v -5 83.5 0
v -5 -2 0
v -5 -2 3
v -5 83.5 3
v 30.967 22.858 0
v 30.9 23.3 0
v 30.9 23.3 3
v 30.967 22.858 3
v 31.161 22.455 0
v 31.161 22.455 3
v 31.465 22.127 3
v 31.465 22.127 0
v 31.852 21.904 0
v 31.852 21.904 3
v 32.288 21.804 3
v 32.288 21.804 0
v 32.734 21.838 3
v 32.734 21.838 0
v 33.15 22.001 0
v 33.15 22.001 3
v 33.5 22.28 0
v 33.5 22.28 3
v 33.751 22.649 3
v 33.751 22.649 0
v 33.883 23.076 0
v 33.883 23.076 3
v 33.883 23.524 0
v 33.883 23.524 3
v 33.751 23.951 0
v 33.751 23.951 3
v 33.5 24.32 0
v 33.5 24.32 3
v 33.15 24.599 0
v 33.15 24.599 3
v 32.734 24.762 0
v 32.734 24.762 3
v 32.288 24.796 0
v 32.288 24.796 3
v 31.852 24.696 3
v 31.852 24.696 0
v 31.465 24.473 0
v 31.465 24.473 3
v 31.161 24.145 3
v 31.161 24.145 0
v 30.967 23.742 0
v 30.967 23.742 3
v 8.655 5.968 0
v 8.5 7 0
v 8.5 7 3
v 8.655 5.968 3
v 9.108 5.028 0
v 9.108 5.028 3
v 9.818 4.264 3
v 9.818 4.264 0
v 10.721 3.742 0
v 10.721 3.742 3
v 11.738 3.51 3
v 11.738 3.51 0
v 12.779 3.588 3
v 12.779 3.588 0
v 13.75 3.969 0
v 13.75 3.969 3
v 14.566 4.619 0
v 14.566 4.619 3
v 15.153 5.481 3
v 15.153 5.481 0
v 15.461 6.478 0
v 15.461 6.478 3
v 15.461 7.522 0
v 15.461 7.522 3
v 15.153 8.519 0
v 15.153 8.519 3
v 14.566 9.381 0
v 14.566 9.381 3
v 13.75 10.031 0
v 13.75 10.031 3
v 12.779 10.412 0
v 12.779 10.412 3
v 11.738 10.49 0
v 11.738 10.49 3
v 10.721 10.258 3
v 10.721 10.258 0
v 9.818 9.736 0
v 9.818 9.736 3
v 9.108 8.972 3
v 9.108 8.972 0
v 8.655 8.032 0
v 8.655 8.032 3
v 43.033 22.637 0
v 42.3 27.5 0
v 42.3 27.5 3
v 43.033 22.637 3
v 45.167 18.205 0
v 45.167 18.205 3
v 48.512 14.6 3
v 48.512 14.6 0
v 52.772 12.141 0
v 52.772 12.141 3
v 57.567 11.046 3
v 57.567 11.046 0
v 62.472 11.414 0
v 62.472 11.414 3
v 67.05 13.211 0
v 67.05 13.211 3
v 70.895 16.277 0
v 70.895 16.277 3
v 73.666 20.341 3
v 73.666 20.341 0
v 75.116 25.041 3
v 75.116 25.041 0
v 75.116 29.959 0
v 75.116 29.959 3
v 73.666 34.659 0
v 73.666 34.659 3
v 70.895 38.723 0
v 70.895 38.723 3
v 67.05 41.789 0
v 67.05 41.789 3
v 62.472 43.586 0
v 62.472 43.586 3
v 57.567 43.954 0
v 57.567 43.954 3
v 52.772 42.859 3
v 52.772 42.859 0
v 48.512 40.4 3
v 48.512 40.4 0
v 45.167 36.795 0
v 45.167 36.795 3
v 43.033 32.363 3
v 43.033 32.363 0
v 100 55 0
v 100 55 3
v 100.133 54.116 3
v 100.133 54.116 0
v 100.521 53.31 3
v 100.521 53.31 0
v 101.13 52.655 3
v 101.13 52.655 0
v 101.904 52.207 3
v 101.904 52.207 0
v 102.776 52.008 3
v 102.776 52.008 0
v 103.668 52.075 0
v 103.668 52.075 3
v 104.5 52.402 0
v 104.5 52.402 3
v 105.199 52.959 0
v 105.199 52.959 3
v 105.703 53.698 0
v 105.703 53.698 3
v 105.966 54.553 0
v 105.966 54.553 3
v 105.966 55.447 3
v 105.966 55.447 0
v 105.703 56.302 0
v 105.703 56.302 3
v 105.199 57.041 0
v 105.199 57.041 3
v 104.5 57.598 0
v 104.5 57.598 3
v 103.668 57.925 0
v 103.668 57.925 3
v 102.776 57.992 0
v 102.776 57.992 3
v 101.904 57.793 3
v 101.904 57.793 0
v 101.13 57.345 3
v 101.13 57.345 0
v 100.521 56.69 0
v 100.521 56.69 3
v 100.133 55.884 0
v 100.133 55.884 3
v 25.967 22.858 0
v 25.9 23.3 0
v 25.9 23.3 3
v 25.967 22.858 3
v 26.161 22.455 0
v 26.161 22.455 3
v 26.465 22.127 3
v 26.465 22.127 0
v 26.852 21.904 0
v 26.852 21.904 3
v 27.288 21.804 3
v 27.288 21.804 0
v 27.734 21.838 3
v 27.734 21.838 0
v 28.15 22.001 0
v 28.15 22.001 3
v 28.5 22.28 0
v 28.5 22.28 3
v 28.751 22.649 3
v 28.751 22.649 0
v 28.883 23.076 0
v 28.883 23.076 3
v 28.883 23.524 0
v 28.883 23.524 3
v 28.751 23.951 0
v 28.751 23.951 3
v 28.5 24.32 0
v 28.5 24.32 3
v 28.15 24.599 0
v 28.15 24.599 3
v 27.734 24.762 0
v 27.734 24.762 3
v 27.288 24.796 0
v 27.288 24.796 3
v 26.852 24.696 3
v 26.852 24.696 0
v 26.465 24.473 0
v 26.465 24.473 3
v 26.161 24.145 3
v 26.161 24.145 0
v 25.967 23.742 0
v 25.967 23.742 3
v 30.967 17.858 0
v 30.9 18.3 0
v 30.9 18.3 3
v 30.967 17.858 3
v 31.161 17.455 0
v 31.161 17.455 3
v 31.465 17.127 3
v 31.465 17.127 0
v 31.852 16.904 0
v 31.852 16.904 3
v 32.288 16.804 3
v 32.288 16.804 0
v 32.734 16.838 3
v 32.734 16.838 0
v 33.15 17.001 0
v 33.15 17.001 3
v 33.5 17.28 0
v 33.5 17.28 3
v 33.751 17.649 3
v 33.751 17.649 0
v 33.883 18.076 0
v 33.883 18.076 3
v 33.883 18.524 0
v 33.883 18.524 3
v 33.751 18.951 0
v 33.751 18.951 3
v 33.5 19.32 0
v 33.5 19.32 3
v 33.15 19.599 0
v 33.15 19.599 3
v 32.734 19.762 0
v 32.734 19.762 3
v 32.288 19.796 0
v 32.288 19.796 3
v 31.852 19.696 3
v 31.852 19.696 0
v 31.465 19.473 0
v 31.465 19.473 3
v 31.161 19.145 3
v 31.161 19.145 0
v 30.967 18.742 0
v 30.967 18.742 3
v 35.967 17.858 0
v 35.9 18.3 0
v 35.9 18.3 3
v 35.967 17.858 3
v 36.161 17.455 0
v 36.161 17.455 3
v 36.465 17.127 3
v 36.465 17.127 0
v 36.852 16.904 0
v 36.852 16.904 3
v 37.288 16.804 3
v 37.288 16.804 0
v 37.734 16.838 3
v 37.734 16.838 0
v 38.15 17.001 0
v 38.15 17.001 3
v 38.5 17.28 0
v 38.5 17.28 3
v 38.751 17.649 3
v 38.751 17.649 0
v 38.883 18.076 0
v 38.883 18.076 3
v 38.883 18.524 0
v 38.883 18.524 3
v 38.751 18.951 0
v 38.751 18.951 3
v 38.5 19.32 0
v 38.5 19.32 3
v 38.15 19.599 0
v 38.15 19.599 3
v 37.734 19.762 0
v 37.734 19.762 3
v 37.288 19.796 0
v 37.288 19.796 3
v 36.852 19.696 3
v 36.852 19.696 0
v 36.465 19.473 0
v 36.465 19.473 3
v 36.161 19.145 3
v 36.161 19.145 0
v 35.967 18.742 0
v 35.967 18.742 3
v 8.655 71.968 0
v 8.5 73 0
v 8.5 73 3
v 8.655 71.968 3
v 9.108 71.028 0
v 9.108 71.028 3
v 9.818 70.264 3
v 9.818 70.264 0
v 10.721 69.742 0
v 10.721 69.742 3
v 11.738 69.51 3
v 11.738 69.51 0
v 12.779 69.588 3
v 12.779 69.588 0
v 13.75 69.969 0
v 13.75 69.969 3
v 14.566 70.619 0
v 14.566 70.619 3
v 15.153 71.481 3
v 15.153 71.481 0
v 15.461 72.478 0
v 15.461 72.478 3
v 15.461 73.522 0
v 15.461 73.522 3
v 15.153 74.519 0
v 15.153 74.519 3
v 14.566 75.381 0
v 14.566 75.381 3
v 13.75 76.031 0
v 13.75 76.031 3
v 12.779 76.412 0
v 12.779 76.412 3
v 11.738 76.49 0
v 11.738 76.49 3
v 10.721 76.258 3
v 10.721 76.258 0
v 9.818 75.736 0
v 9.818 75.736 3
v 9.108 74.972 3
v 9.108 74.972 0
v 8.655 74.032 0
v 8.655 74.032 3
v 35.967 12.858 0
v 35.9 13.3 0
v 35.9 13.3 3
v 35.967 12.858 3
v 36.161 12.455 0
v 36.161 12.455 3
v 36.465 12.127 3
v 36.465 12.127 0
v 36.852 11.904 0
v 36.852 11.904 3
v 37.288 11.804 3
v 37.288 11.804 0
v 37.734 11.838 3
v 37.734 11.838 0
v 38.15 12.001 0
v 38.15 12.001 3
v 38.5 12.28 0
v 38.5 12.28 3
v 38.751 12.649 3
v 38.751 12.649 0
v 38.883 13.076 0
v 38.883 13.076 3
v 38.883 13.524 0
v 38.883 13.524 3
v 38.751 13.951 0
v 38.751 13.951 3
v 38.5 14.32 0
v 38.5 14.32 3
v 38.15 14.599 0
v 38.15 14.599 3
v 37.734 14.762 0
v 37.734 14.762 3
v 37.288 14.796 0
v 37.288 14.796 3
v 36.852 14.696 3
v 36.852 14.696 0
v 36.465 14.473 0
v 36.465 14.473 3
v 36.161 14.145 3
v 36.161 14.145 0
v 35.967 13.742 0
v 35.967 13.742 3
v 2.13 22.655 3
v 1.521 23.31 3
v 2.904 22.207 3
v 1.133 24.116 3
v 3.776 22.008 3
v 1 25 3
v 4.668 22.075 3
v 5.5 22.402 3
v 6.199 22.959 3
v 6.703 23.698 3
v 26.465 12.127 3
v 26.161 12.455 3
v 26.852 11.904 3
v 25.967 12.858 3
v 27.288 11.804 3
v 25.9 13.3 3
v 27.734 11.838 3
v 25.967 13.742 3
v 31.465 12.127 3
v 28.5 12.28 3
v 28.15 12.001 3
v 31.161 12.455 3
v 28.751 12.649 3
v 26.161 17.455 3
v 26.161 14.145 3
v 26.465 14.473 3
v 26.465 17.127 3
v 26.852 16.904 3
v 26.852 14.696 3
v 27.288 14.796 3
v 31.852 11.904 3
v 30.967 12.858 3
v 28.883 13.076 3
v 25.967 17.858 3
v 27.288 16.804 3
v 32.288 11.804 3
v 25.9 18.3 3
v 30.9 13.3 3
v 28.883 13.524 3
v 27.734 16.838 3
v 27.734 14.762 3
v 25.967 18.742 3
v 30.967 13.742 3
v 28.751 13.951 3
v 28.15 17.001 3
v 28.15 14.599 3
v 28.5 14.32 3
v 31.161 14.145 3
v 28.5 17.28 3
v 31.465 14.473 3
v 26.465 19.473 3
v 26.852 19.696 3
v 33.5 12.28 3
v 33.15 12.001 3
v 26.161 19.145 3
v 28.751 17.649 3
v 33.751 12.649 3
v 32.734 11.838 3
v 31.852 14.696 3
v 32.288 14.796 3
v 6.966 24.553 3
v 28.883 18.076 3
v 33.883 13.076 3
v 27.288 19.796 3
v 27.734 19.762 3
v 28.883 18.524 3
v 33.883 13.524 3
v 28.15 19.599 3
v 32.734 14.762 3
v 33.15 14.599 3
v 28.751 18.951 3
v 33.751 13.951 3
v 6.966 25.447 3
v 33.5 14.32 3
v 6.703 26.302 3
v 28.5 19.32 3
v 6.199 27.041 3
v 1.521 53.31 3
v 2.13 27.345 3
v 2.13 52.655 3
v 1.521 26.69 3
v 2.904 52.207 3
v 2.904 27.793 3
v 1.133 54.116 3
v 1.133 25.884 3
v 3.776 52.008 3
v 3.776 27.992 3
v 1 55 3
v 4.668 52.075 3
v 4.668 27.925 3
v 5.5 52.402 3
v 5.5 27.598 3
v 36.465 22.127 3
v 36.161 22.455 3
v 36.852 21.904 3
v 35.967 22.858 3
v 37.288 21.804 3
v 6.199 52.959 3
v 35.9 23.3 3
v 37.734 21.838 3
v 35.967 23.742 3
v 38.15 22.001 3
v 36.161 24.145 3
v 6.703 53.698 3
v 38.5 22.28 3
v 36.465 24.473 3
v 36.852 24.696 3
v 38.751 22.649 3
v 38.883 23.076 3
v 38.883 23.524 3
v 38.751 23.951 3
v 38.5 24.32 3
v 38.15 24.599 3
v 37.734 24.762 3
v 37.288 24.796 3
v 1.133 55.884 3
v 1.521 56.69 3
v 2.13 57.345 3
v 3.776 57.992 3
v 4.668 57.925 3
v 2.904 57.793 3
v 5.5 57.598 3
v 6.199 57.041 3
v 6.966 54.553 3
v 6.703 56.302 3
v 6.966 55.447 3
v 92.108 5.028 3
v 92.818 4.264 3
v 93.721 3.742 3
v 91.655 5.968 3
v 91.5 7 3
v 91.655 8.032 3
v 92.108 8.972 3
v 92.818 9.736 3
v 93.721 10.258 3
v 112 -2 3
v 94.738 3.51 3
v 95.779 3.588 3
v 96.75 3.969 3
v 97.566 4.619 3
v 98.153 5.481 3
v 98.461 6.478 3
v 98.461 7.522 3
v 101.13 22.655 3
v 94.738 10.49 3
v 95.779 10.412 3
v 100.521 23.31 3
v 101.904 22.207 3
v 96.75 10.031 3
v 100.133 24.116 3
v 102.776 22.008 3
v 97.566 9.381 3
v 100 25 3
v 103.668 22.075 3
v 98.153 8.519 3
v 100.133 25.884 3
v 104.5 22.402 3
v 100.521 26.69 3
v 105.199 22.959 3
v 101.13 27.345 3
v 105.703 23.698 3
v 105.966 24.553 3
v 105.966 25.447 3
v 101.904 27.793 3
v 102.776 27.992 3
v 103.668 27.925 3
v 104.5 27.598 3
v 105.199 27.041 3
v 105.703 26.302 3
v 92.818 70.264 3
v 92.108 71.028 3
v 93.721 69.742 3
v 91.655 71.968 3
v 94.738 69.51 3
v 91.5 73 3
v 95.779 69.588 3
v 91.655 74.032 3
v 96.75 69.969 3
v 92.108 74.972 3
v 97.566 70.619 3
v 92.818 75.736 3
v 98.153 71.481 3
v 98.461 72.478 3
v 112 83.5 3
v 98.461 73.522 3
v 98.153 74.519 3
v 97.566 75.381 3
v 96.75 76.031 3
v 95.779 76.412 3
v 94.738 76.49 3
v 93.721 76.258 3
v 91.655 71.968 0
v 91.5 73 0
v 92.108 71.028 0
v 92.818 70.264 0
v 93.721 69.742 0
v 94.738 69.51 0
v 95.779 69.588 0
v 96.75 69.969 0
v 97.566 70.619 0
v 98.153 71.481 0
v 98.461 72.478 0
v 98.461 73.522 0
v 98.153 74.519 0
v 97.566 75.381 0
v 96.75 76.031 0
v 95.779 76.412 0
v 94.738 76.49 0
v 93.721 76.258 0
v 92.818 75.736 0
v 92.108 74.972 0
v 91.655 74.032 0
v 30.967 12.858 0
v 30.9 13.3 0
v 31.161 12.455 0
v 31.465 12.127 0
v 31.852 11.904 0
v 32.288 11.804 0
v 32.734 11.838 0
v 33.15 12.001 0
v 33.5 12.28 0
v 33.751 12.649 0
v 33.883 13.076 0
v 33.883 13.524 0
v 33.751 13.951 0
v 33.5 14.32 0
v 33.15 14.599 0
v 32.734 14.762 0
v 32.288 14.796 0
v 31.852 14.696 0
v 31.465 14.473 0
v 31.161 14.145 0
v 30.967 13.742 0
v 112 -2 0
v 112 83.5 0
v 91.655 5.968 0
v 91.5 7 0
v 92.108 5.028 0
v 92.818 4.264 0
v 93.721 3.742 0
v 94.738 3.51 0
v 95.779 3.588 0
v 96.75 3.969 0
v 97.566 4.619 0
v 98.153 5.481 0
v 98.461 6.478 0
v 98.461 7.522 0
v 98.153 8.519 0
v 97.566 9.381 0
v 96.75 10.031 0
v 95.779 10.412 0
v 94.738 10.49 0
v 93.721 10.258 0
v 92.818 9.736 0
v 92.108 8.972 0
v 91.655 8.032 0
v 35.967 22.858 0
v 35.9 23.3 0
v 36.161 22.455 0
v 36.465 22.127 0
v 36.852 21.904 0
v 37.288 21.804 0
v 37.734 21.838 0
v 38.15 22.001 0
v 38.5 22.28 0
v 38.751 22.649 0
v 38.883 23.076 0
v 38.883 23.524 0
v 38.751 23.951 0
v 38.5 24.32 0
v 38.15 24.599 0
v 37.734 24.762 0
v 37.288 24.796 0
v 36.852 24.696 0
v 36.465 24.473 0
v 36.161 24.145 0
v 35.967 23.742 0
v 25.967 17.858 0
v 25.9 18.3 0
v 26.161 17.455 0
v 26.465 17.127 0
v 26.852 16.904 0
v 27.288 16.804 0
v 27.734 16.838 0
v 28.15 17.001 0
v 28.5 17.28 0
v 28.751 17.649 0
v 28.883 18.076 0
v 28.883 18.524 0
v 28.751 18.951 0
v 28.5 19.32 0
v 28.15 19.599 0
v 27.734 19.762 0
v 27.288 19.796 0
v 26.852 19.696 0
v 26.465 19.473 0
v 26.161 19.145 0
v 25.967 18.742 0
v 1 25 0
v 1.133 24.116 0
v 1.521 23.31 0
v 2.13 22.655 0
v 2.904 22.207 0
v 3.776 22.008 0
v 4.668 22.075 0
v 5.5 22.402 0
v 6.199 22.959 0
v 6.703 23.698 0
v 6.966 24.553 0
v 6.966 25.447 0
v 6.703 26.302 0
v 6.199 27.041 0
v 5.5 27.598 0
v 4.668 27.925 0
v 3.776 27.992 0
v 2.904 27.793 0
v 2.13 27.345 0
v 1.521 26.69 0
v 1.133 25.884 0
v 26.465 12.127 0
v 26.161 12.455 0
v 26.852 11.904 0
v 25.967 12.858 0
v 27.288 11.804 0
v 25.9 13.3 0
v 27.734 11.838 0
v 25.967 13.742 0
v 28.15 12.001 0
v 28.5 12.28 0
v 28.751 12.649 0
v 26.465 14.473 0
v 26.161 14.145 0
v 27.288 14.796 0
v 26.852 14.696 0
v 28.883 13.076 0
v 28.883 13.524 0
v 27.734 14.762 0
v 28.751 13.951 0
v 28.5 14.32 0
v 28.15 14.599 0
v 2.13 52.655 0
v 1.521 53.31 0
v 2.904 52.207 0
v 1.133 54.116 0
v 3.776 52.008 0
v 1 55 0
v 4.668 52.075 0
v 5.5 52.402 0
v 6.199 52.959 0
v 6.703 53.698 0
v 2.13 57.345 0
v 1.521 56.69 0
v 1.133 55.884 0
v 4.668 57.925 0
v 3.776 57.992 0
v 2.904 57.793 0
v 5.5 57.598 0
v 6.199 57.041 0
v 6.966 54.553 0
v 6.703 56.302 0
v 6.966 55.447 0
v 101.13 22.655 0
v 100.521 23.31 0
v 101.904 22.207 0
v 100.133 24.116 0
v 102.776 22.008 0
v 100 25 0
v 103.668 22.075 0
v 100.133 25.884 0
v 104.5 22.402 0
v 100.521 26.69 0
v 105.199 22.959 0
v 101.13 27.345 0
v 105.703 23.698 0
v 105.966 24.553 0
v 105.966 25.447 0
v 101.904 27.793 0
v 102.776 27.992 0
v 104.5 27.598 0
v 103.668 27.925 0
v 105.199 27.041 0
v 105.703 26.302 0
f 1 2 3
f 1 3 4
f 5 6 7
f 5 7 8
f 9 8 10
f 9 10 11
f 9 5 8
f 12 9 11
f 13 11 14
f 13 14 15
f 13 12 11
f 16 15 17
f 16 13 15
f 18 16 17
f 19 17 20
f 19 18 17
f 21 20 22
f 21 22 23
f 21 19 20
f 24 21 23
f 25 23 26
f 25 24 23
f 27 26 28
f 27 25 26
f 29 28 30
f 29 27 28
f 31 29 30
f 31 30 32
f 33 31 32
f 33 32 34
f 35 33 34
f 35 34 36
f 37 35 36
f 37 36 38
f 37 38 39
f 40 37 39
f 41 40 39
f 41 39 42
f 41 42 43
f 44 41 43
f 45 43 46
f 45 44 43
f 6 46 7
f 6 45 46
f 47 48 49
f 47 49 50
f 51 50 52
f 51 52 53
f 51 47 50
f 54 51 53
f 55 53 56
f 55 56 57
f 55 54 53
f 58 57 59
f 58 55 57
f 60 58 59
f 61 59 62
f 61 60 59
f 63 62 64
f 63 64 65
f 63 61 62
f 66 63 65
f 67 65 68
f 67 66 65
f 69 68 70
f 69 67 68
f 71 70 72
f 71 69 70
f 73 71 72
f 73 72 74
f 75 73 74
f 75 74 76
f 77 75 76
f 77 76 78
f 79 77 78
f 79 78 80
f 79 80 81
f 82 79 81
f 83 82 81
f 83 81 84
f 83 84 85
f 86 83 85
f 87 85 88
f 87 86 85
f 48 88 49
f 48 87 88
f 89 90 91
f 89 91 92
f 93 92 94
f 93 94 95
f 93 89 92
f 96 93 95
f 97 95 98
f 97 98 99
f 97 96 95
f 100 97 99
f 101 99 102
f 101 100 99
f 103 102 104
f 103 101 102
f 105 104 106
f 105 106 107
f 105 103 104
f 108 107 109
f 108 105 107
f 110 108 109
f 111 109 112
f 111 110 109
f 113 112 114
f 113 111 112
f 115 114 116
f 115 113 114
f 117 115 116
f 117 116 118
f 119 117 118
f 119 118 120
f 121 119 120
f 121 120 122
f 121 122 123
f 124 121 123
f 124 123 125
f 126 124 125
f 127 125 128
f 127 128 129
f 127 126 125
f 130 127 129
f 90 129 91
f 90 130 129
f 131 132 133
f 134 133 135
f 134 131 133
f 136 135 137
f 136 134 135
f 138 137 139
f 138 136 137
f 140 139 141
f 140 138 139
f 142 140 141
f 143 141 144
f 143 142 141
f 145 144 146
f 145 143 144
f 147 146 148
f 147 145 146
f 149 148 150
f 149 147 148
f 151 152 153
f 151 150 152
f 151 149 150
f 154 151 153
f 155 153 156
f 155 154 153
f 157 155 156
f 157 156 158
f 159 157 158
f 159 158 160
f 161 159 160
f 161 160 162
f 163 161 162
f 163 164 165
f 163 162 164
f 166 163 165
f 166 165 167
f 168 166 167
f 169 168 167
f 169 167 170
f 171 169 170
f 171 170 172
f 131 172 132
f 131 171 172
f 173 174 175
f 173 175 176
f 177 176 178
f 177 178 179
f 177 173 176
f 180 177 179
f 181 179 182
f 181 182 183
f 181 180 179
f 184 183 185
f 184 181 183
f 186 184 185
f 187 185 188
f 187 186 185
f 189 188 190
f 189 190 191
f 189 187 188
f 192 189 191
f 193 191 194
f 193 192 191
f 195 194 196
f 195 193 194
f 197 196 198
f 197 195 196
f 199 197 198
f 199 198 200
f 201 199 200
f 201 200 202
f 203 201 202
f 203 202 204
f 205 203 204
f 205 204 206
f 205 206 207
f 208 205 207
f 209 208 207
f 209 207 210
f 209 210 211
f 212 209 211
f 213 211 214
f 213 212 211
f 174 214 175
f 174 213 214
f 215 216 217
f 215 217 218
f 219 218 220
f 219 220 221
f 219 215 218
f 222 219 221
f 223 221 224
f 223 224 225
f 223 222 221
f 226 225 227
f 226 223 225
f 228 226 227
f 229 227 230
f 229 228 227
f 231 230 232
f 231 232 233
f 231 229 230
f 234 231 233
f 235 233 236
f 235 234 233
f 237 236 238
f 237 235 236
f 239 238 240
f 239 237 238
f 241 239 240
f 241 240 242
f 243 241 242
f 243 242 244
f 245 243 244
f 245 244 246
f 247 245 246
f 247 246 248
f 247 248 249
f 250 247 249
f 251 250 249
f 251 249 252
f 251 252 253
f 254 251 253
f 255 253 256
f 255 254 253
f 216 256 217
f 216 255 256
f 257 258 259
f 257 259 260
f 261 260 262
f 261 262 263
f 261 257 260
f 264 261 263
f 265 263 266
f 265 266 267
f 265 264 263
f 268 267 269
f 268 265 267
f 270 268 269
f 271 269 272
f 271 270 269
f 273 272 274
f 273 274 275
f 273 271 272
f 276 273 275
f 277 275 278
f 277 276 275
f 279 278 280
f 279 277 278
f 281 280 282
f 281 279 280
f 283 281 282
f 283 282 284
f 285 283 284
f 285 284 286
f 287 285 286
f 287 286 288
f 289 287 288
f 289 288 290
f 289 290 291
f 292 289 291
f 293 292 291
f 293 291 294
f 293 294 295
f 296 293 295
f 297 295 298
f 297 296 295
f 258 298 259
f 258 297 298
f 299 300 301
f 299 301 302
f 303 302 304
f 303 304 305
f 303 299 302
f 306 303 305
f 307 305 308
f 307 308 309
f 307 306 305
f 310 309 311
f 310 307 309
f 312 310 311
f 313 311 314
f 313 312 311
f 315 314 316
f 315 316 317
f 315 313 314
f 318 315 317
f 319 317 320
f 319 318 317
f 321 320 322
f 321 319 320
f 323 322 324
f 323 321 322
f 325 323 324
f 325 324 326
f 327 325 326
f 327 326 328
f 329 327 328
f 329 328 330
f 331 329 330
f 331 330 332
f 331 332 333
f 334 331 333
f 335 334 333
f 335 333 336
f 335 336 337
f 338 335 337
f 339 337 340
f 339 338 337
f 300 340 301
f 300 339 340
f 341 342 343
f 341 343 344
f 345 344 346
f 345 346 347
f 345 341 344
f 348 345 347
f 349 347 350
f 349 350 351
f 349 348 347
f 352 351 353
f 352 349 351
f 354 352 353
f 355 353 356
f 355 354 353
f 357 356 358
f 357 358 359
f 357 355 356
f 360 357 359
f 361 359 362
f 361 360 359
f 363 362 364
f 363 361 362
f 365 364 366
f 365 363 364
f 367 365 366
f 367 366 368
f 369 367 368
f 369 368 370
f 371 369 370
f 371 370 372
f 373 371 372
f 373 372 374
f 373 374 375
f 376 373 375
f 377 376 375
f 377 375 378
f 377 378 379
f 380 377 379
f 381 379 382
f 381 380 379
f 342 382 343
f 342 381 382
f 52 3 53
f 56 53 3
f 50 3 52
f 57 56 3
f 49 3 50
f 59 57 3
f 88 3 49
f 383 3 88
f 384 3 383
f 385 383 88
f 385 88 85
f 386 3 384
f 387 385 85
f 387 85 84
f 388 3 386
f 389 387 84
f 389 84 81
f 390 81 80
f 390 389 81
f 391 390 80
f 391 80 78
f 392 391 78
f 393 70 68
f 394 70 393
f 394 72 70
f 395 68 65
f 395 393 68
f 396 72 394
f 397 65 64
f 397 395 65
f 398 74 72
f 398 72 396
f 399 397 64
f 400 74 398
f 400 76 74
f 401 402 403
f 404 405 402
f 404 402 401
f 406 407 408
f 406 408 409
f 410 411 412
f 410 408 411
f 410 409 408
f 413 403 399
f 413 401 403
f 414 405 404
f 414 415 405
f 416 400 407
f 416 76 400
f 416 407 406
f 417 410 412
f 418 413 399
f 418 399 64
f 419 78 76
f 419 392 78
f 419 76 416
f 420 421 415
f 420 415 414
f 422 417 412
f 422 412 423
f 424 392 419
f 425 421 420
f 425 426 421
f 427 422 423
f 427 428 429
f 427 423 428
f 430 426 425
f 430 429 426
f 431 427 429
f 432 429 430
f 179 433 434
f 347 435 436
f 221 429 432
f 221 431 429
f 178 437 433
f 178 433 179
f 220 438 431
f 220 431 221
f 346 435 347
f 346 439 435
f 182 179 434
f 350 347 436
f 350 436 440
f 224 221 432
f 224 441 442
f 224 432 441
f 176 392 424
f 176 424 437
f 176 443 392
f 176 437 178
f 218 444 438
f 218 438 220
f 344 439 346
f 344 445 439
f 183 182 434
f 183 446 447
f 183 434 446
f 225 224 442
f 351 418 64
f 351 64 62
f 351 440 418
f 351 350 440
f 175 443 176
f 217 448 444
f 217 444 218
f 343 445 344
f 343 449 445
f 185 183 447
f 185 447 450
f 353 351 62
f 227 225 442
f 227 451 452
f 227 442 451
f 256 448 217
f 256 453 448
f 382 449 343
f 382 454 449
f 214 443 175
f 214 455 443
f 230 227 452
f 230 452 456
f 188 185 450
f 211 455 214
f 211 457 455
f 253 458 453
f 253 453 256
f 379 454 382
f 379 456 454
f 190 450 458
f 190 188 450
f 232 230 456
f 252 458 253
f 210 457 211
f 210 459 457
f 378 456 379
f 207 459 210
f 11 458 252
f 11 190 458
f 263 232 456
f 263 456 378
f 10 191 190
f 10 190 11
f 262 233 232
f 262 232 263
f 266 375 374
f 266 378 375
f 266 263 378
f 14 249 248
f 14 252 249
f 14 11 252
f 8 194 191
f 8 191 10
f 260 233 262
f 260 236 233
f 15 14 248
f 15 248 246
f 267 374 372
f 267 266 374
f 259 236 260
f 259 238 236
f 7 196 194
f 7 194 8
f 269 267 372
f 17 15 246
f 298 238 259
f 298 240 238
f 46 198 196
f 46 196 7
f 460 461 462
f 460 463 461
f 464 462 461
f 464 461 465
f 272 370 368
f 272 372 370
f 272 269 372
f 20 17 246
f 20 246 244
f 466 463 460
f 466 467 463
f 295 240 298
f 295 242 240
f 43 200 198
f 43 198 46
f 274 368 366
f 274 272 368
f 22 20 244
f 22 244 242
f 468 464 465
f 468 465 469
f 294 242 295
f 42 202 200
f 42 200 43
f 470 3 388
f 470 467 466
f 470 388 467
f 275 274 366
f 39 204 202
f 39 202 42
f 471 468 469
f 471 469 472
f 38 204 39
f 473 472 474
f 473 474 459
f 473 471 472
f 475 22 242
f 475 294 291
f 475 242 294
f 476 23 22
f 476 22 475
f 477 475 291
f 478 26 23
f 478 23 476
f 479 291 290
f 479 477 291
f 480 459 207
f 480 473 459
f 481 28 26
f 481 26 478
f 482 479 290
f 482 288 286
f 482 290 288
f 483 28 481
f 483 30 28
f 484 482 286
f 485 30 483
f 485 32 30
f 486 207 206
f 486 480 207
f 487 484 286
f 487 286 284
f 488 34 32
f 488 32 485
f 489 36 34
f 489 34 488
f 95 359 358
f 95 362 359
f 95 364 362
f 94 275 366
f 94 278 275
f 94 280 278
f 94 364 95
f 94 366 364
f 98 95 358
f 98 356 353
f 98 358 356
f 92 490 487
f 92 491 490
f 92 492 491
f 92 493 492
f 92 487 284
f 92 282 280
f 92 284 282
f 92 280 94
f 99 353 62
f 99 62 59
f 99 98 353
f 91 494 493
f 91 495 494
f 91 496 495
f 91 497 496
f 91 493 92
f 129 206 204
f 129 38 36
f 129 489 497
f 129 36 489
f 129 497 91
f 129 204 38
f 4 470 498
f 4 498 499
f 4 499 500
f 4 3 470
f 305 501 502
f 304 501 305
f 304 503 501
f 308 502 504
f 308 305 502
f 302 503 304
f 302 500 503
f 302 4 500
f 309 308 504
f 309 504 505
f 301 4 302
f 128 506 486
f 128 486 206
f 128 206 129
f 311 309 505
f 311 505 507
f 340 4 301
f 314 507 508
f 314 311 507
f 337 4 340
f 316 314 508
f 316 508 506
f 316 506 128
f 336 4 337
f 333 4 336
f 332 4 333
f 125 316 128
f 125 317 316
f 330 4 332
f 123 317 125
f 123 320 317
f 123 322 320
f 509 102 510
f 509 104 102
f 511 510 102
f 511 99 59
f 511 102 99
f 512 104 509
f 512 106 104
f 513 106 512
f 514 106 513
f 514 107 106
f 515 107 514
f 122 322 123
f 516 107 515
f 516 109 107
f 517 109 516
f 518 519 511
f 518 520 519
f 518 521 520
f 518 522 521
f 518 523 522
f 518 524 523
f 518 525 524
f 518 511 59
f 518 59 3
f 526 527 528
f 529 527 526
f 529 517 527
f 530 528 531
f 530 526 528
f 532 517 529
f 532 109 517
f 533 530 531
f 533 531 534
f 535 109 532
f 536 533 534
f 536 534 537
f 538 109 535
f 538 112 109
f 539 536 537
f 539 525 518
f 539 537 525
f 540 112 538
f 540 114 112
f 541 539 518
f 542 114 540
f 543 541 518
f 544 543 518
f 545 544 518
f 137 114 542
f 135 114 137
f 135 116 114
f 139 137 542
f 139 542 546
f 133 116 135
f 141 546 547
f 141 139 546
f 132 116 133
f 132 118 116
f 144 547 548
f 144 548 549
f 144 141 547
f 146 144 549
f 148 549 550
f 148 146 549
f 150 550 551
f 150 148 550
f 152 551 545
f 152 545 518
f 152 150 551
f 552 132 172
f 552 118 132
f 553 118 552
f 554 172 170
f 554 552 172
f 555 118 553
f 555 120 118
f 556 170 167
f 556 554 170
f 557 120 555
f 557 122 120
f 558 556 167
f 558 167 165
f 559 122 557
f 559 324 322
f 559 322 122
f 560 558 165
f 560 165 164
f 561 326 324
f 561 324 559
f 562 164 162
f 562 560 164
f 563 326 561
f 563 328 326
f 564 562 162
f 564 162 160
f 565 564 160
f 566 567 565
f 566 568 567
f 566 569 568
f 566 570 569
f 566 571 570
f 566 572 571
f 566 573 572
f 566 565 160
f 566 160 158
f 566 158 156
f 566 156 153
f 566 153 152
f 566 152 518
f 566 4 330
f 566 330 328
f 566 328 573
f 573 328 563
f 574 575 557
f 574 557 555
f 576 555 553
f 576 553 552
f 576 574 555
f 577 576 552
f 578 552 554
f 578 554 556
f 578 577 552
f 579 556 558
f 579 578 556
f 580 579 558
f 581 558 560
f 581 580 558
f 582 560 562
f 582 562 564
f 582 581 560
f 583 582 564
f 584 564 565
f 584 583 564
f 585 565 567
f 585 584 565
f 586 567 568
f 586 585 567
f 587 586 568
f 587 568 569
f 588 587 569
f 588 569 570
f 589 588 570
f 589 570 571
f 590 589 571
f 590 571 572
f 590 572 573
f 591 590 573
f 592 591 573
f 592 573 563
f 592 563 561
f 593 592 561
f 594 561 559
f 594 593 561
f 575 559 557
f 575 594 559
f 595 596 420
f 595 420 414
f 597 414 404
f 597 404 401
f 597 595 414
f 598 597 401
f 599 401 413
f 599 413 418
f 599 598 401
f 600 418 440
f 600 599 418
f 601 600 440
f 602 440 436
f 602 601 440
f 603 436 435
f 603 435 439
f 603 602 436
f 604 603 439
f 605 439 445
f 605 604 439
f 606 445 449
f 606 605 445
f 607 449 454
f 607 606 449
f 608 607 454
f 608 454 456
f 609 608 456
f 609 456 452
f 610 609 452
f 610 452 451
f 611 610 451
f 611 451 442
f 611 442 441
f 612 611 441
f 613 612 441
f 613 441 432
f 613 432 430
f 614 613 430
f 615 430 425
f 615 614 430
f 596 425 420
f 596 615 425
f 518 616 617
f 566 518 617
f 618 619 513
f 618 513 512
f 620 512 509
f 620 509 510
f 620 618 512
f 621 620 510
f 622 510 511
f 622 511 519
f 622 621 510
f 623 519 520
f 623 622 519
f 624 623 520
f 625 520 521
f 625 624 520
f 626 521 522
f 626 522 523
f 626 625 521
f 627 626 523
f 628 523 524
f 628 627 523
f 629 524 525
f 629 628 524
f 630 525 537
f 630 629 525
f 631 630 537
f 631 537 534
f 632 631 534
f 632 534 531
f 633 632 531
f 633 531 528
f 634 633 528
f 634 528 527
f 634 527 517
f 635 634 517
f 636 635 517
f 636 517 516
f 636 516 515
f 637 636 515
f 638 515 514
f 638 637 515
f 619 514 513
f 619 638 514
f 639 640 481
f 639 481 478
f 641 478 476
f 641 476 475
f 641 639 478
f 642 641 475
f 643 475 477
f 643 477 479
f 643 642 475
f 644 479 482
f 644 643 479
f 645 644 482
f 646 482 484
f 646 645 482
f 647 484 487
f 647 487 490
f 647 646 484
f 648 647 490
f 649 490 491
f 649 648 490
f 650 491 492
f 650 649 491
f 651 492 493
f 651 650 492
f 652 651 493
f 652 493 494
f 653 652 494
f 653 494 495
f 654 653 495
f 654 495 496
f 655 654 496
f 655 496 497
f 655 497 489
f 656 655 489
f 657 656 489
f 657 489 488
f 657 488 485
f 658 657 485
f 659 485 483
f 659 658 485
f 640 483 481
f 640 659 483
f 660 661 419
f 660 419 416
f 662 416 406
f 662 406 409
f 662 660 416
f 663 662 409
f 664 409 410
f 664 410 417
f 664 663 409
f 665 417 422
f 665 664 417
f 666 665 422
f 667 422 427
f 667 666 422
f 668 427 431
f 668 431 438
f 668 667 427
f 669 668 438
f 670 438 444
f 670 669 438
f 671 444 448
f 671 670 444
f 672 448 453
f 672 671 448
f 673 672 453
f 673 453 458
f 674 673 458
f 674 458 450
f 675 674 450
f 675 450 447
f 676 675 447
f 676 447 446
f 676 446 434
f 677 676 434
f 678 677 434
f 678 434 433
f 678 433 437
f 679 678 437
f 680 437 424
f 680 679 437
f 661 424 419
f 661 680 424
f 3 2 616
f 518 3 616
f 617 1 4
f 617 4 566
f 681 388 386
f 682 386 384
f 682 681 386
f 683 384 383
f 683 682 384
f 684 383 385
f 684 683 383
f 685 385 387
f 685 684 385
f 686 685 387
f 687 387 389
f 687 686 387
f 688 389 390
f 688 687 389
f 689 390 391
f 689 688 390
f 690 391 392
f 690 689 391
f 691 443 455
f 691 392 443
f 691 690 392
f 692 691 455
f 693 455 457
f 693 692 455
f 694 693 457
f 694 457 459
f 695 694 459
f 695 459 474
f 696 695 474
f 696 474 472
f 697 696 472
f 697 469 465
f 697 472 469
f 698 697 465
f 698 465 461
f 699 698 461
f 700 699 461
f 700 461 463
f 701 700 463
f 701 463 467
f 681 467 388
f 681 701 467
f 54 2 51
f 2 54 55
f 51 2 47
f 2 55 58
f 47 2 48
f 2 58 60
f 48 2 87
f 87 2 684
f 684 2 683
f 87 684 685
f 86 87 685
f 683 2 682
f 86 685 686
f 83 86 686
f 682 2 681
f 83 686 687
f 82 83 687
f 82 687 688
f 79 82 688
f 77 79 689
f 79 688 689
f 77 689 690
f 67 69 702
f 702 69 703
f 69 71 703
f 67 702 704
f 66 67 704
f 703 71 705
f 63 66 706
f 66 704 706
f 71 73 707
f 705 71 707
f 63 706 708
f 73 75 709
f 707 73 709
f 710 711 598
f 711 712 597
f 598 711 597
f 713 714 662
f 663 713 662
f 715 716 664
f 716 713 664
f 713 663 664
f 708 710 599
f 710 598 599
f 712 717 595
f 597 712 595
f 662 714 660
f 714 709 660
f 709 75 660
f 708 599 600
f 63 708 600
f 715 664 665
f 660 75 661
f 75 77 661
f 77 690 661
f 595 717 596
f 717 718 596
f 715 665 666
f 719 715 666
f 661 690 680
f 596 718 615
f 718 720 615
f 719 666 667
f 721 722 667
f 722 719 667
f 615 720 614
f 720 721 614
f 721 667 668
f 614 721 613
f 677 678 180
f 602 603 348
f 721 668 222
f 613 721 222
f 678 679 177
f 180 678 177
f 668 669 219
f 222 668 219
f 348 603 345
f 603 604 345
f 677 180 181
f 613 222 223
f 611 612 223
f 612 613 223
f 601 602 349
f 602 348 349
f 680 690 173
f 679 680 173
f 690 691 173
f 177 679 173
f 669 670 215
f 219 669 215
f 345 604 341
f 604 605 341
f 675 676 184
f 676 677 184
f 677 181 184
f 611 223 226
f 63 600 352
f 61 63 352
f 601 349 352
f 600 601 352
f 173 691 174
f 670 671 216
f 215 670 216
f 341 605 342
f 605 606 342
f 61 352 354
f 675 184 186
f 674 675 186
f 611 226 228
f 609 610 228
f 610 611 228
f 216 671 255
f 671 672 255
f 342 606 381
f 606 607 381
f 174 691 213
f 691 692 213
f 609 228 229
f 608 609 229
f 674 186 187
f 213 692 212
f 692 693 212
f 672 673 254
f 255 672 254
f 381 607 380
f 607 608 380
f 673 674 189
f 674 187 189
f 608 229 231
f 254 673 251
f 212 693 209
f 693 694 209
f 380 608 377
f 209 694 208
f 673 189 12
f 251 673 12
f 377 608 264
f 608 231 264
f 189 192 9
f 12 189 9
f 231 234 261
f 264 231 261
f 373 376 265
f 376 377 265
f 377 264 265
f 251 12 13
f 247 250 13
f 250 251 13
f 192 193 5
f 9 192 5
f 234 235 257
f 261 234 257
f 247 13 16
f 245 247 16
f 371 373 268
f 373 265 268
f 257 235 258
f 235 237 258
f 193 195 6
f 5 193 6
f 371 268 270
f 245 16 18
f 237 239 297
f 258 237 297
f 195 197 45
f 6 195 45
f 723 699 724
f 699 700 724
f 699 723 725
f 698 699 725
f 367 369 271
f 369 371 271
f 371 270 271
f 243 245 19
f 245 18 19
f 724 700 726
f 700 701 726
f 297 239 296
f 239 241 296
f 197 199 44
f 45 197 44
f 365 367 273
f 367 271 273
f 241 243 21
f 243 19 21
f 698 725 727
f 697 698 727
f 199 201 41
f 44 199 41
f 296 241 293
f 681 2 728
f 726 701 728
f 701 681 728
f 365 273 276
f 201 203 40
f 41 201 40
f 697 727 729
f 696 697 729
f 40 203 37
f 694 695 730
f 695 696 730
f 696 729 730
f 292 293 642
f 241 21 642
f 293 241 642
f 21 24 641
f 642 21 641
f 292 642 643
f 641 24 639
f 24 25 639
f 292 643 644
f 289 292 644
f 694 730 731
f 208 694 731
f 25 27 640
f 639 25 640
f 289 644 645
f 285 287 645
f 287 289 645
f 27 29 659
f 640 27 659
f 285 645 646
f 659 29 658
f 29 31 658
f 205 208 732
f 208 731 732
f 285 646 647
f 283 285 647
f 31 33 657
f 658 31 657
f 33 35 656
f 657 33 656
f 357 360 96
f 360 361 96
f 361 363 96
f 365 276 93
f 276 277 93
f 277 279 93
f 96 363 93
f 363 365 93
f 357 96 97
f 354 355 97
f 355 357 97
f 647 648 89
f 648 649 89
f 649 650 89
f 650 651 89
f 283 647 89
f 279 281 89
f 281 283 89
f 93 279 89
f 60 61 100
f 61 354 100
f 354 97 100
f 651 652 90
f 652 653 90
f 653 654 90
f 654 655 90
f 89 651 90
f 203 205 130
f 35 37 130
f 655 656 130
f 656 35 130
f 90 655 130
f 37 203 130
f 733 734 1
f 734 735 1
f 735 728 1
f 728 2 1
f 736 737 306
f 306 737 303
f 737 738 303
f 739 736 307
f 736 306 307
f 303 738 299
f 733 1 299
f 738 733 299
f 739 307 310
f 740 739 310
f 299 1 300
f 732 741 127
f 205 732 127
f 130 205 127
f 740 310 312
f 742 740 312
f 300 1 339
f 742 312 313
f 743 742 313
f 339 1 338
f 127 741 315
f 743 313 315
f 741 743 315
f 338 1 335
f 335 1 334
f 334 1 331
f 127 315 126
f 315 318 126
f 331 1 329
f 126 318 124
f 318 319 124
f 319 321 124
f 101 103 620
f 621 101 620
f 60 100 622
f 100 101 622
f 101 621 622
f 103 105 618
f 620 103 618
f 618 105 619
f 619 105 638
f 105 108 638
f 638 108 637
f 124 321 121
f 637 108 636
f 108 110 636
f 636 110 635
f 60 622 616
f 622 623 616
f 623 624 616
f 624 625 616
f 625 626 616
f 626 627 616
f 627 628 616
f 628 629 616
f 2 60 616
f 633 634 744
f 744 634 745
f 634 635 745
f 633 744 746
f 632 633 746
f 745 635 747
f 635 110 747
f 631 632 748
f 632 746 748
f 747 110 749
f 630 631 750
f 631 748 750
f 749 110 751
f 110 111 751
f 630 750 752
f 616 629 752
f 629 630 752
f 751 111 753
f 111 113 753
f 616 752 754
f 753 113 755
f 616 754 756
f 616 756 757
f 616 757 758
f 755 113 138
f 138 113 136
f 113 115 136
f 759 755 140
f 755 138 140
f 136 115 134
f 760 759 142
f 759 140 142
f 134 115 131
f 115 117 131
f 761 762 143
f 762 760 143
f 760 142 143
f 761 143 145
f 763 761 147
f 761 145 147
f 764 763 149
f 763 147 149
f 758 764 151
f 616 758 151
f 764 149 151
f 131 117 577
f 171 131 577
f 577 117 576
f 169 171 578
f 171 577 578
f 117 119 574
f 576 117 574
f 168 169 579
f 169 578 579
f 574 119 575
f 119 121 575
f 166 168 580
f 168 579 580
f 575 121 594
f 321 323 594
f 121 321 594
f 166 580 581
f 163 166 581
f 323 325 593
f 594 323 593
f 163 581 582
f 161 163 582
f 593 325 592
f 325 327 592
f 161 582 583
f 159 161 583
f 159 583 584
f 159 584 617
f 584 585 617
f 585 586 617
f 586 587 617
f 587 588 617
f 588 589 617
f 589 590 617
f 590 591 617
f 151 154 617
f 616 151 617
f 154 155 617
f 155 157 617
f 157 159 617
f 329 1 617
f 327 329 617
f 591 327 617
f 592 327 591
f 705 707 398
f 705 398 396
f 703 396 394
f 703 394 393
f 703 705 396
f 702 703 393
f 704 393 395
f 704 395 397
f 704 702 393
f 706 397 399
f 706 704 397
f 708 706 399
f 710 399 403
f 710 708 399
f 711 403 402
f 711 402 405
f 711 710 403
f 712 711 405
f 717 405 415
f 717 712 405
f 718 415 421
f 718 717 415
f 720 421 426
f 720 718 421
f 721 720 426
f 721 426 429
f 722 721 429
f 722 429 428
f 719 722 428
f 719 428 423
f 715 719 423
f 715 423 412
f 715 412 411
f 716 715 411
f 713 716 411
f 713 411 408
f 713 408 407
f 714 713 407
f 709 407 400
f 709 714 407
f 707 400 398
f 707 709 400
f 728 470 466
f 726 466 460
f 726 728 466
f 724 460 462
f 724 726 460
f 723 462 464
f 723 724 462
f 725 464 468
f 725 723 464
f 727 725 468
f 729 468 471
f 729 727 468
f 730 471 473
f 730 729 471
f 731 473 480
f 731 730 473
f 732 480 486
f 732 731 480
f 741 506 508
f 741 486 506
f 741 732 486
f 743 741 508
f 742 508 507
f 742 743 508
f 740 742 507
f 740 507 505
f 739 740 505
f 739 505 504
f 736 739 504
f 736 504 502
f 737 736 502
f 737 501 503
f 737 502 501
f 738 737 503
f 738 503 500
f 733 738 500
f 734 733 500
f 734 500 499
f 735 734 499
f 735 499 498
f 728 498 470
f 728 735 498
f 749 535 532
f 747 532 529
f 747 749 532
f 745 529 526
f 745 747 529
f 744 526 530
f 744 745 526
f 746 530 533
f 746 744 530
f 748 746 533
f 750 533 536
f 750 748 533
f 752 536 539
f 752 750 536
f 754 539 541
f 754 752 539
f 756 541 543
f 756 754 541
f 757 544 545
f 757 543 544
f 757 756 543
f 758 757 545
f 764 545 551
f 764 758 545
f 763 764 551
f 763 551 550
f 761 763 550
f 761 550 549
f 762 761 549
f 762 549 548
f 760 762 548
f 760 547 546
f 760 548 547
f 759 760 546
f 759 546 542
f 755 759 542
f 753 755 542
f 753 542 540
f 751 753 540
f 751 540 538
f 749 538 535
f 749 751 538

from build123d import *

# Parameters (mm, degrees)
SKETCH_1_W                                     = 117
SKETCH_1_H                                     = 84
BOTTOM_LOWER_BASE_PLATE_3MM_DEPTH              = 3
SKETCH_3_R                                     = 3.5
BOTTOM_LOWER_SCREW_6MM_THROUGH_DEPTH           = 3
SKETCH_5_R                                     = 16.5
BOTTOM_LOWER_BATTERY_CLEARANCE_33MM_DEPTH      = 3
SKETCH_9_R                                     = 1.5
BOTTOM_LOWER_BUZZER_SOUND_HOLES_3MM_DEPTH      = 3
SKETCH_10_R                                    = 3
BOTTOM_LOWER_CENTER_RAIL_SCREW_HEADS_6MM_DEPTH = 6
SKETCH_11_W                                    = 117
SKETCH_11_H                                    = 1.5
BOTTOM_LOWER_REAR_EXTENSION_1P5MM_DEPTH        = 3


with BuildPart() as part:
    # Эскиз1 → bottom_lower_base_plate_3mm (new body)
    with BuildSketch(Plane.XY):
        with Locations((53.5, 40)):
            Rectangle(SKETCH_1_W, SKETCH_1_H)
    extrude(amount=BOTTOM_LOWER_BASE_PLATE_3MM_DEPTH)

    # Эскиз3 → bottom_lower_screw_6mm_through (cut)
    with BuildSketch(Plane.XY):
        with Locations(Location((12, 7, 0), (0, 0, 180))):
            Circle(SKETCH_3_R)
        with Locations(Location((95, 7, 0), (0, 0, 180))):
            Circle(SKETCH_3_R)
        with Locations(Location((12, 73, 0), (0, 0, 180))):
            Circle(SKETCH_3_R)
        with Locations(Location((95, 73, 0), (0, 0, 180))):
            Circle(SKETCH_3_R)
    extrude(amount=BOTTOM_LOWER_SCREW_6MM_THROUGH_DEPTH, mode=Mode.SUBTRACT)

    # Эскиз5 → bottom_lower_battery_clearance_33mm (cut)
    with BuildSketch(Plane(origin=(0, 8, 0), x_dir=(1, 0, 0), z_dir=(0, 0, 1))):
        with Locations(Location((58.8, 19.5, 0), (0, 0, 180))):
            Circle(SKETCH_5_R)
    extrude(amount=BOTTOM_LOWER_BATTERY_CLEARANCE_33MM_DEPTH, mode=Mode.SUBTRACT)

    # Эскиз9 → bottom_lower_buzzer_sound_holes_3mm (cut)
    with BuildSketch(Plane(origin=(0, 4, 0), x_dir=(1, 0, 0), z_dir=(0, 0, 1))):
        with Locations(Location((27.4, 9.3, 0), (0, 0, 180))):
            Circle(SKETCH_9_R)
        with Locations(Location((27.4, 14.3, 0), (0, 0, 180))):
            Circle(SKETCH_9_R)
        with Locations(Location((27.4, 19.3, 0), (0, 0, 180))):
            Circle(SKETCH_9_R)
        with Locations(Location((32.4, 9.3, 0), (0, 0, 180))):
            Circle(SKETCH_9_R)
        with Locations(Location((32.4, 14.3, 0), (0, 0, 180))):
            Circle(SKETCH_9_R)
        with Locations(Location((32.4, 19.3, 0), (0, 0, 180))):
            Circle(SKETCH_9_R)
        with Locations(Location((37.4, 9.3, 0), (0, 0, 180))):
            Circle(SKETCH_9_R)
        with Locations(Location((37.4, 14.3, 0), (0, 0, 180))):
            Circle(SKETCH_9_R)
        with Locations(Location((37.4, 19.3, 0), (0, 0, 180))):
            Circle(SKETCH_9_R)
    extrude(amount=BOTTOM_LOWER_BUZZER_SOUND_HOLES_3MM_DEPTH, mode=Mode.SUBTRACT)

    # Эскиз10 → bottom_lower_center_rail_screw_heads_6mm (cut)
    with BuildSketch(Plane.XY):
        with Locations(Location((4, 25, 0), (0, 0, 180))):
            Circle(SKETCH_10_R)
        with Locations(Location((4, 55, 0), (0, 0, 180))):
            Circle(SKETCH_10_R)
        with Locations(Location((103, 25, 0), (0, 0, 180))):
            Circle(SKETCH_10_R)
        with Locations(Location((103, 55, 0), (0, 0, 180))):
            Circle(SKETCH_10_R)
    extrude(amount=BOTTOM_LOWER_CENTER_RAIL_SCREW_HEADS_6MM_DEPTH, mode=Mode.SUBTRACT)

    # Эскиз11 → bottom_lower_rear_extension_1p5mm (add)
    with BuildSketch(Plane.XY):
        with Locations((53.5, 82.75)):
            Rectangle(SKETCH_11_W, SKETCH_11_H)
    extrude(amount=BOTTOM_LOWER_REAR_EXTENSION_1P5MM_DEPTH)


solid = part.part
